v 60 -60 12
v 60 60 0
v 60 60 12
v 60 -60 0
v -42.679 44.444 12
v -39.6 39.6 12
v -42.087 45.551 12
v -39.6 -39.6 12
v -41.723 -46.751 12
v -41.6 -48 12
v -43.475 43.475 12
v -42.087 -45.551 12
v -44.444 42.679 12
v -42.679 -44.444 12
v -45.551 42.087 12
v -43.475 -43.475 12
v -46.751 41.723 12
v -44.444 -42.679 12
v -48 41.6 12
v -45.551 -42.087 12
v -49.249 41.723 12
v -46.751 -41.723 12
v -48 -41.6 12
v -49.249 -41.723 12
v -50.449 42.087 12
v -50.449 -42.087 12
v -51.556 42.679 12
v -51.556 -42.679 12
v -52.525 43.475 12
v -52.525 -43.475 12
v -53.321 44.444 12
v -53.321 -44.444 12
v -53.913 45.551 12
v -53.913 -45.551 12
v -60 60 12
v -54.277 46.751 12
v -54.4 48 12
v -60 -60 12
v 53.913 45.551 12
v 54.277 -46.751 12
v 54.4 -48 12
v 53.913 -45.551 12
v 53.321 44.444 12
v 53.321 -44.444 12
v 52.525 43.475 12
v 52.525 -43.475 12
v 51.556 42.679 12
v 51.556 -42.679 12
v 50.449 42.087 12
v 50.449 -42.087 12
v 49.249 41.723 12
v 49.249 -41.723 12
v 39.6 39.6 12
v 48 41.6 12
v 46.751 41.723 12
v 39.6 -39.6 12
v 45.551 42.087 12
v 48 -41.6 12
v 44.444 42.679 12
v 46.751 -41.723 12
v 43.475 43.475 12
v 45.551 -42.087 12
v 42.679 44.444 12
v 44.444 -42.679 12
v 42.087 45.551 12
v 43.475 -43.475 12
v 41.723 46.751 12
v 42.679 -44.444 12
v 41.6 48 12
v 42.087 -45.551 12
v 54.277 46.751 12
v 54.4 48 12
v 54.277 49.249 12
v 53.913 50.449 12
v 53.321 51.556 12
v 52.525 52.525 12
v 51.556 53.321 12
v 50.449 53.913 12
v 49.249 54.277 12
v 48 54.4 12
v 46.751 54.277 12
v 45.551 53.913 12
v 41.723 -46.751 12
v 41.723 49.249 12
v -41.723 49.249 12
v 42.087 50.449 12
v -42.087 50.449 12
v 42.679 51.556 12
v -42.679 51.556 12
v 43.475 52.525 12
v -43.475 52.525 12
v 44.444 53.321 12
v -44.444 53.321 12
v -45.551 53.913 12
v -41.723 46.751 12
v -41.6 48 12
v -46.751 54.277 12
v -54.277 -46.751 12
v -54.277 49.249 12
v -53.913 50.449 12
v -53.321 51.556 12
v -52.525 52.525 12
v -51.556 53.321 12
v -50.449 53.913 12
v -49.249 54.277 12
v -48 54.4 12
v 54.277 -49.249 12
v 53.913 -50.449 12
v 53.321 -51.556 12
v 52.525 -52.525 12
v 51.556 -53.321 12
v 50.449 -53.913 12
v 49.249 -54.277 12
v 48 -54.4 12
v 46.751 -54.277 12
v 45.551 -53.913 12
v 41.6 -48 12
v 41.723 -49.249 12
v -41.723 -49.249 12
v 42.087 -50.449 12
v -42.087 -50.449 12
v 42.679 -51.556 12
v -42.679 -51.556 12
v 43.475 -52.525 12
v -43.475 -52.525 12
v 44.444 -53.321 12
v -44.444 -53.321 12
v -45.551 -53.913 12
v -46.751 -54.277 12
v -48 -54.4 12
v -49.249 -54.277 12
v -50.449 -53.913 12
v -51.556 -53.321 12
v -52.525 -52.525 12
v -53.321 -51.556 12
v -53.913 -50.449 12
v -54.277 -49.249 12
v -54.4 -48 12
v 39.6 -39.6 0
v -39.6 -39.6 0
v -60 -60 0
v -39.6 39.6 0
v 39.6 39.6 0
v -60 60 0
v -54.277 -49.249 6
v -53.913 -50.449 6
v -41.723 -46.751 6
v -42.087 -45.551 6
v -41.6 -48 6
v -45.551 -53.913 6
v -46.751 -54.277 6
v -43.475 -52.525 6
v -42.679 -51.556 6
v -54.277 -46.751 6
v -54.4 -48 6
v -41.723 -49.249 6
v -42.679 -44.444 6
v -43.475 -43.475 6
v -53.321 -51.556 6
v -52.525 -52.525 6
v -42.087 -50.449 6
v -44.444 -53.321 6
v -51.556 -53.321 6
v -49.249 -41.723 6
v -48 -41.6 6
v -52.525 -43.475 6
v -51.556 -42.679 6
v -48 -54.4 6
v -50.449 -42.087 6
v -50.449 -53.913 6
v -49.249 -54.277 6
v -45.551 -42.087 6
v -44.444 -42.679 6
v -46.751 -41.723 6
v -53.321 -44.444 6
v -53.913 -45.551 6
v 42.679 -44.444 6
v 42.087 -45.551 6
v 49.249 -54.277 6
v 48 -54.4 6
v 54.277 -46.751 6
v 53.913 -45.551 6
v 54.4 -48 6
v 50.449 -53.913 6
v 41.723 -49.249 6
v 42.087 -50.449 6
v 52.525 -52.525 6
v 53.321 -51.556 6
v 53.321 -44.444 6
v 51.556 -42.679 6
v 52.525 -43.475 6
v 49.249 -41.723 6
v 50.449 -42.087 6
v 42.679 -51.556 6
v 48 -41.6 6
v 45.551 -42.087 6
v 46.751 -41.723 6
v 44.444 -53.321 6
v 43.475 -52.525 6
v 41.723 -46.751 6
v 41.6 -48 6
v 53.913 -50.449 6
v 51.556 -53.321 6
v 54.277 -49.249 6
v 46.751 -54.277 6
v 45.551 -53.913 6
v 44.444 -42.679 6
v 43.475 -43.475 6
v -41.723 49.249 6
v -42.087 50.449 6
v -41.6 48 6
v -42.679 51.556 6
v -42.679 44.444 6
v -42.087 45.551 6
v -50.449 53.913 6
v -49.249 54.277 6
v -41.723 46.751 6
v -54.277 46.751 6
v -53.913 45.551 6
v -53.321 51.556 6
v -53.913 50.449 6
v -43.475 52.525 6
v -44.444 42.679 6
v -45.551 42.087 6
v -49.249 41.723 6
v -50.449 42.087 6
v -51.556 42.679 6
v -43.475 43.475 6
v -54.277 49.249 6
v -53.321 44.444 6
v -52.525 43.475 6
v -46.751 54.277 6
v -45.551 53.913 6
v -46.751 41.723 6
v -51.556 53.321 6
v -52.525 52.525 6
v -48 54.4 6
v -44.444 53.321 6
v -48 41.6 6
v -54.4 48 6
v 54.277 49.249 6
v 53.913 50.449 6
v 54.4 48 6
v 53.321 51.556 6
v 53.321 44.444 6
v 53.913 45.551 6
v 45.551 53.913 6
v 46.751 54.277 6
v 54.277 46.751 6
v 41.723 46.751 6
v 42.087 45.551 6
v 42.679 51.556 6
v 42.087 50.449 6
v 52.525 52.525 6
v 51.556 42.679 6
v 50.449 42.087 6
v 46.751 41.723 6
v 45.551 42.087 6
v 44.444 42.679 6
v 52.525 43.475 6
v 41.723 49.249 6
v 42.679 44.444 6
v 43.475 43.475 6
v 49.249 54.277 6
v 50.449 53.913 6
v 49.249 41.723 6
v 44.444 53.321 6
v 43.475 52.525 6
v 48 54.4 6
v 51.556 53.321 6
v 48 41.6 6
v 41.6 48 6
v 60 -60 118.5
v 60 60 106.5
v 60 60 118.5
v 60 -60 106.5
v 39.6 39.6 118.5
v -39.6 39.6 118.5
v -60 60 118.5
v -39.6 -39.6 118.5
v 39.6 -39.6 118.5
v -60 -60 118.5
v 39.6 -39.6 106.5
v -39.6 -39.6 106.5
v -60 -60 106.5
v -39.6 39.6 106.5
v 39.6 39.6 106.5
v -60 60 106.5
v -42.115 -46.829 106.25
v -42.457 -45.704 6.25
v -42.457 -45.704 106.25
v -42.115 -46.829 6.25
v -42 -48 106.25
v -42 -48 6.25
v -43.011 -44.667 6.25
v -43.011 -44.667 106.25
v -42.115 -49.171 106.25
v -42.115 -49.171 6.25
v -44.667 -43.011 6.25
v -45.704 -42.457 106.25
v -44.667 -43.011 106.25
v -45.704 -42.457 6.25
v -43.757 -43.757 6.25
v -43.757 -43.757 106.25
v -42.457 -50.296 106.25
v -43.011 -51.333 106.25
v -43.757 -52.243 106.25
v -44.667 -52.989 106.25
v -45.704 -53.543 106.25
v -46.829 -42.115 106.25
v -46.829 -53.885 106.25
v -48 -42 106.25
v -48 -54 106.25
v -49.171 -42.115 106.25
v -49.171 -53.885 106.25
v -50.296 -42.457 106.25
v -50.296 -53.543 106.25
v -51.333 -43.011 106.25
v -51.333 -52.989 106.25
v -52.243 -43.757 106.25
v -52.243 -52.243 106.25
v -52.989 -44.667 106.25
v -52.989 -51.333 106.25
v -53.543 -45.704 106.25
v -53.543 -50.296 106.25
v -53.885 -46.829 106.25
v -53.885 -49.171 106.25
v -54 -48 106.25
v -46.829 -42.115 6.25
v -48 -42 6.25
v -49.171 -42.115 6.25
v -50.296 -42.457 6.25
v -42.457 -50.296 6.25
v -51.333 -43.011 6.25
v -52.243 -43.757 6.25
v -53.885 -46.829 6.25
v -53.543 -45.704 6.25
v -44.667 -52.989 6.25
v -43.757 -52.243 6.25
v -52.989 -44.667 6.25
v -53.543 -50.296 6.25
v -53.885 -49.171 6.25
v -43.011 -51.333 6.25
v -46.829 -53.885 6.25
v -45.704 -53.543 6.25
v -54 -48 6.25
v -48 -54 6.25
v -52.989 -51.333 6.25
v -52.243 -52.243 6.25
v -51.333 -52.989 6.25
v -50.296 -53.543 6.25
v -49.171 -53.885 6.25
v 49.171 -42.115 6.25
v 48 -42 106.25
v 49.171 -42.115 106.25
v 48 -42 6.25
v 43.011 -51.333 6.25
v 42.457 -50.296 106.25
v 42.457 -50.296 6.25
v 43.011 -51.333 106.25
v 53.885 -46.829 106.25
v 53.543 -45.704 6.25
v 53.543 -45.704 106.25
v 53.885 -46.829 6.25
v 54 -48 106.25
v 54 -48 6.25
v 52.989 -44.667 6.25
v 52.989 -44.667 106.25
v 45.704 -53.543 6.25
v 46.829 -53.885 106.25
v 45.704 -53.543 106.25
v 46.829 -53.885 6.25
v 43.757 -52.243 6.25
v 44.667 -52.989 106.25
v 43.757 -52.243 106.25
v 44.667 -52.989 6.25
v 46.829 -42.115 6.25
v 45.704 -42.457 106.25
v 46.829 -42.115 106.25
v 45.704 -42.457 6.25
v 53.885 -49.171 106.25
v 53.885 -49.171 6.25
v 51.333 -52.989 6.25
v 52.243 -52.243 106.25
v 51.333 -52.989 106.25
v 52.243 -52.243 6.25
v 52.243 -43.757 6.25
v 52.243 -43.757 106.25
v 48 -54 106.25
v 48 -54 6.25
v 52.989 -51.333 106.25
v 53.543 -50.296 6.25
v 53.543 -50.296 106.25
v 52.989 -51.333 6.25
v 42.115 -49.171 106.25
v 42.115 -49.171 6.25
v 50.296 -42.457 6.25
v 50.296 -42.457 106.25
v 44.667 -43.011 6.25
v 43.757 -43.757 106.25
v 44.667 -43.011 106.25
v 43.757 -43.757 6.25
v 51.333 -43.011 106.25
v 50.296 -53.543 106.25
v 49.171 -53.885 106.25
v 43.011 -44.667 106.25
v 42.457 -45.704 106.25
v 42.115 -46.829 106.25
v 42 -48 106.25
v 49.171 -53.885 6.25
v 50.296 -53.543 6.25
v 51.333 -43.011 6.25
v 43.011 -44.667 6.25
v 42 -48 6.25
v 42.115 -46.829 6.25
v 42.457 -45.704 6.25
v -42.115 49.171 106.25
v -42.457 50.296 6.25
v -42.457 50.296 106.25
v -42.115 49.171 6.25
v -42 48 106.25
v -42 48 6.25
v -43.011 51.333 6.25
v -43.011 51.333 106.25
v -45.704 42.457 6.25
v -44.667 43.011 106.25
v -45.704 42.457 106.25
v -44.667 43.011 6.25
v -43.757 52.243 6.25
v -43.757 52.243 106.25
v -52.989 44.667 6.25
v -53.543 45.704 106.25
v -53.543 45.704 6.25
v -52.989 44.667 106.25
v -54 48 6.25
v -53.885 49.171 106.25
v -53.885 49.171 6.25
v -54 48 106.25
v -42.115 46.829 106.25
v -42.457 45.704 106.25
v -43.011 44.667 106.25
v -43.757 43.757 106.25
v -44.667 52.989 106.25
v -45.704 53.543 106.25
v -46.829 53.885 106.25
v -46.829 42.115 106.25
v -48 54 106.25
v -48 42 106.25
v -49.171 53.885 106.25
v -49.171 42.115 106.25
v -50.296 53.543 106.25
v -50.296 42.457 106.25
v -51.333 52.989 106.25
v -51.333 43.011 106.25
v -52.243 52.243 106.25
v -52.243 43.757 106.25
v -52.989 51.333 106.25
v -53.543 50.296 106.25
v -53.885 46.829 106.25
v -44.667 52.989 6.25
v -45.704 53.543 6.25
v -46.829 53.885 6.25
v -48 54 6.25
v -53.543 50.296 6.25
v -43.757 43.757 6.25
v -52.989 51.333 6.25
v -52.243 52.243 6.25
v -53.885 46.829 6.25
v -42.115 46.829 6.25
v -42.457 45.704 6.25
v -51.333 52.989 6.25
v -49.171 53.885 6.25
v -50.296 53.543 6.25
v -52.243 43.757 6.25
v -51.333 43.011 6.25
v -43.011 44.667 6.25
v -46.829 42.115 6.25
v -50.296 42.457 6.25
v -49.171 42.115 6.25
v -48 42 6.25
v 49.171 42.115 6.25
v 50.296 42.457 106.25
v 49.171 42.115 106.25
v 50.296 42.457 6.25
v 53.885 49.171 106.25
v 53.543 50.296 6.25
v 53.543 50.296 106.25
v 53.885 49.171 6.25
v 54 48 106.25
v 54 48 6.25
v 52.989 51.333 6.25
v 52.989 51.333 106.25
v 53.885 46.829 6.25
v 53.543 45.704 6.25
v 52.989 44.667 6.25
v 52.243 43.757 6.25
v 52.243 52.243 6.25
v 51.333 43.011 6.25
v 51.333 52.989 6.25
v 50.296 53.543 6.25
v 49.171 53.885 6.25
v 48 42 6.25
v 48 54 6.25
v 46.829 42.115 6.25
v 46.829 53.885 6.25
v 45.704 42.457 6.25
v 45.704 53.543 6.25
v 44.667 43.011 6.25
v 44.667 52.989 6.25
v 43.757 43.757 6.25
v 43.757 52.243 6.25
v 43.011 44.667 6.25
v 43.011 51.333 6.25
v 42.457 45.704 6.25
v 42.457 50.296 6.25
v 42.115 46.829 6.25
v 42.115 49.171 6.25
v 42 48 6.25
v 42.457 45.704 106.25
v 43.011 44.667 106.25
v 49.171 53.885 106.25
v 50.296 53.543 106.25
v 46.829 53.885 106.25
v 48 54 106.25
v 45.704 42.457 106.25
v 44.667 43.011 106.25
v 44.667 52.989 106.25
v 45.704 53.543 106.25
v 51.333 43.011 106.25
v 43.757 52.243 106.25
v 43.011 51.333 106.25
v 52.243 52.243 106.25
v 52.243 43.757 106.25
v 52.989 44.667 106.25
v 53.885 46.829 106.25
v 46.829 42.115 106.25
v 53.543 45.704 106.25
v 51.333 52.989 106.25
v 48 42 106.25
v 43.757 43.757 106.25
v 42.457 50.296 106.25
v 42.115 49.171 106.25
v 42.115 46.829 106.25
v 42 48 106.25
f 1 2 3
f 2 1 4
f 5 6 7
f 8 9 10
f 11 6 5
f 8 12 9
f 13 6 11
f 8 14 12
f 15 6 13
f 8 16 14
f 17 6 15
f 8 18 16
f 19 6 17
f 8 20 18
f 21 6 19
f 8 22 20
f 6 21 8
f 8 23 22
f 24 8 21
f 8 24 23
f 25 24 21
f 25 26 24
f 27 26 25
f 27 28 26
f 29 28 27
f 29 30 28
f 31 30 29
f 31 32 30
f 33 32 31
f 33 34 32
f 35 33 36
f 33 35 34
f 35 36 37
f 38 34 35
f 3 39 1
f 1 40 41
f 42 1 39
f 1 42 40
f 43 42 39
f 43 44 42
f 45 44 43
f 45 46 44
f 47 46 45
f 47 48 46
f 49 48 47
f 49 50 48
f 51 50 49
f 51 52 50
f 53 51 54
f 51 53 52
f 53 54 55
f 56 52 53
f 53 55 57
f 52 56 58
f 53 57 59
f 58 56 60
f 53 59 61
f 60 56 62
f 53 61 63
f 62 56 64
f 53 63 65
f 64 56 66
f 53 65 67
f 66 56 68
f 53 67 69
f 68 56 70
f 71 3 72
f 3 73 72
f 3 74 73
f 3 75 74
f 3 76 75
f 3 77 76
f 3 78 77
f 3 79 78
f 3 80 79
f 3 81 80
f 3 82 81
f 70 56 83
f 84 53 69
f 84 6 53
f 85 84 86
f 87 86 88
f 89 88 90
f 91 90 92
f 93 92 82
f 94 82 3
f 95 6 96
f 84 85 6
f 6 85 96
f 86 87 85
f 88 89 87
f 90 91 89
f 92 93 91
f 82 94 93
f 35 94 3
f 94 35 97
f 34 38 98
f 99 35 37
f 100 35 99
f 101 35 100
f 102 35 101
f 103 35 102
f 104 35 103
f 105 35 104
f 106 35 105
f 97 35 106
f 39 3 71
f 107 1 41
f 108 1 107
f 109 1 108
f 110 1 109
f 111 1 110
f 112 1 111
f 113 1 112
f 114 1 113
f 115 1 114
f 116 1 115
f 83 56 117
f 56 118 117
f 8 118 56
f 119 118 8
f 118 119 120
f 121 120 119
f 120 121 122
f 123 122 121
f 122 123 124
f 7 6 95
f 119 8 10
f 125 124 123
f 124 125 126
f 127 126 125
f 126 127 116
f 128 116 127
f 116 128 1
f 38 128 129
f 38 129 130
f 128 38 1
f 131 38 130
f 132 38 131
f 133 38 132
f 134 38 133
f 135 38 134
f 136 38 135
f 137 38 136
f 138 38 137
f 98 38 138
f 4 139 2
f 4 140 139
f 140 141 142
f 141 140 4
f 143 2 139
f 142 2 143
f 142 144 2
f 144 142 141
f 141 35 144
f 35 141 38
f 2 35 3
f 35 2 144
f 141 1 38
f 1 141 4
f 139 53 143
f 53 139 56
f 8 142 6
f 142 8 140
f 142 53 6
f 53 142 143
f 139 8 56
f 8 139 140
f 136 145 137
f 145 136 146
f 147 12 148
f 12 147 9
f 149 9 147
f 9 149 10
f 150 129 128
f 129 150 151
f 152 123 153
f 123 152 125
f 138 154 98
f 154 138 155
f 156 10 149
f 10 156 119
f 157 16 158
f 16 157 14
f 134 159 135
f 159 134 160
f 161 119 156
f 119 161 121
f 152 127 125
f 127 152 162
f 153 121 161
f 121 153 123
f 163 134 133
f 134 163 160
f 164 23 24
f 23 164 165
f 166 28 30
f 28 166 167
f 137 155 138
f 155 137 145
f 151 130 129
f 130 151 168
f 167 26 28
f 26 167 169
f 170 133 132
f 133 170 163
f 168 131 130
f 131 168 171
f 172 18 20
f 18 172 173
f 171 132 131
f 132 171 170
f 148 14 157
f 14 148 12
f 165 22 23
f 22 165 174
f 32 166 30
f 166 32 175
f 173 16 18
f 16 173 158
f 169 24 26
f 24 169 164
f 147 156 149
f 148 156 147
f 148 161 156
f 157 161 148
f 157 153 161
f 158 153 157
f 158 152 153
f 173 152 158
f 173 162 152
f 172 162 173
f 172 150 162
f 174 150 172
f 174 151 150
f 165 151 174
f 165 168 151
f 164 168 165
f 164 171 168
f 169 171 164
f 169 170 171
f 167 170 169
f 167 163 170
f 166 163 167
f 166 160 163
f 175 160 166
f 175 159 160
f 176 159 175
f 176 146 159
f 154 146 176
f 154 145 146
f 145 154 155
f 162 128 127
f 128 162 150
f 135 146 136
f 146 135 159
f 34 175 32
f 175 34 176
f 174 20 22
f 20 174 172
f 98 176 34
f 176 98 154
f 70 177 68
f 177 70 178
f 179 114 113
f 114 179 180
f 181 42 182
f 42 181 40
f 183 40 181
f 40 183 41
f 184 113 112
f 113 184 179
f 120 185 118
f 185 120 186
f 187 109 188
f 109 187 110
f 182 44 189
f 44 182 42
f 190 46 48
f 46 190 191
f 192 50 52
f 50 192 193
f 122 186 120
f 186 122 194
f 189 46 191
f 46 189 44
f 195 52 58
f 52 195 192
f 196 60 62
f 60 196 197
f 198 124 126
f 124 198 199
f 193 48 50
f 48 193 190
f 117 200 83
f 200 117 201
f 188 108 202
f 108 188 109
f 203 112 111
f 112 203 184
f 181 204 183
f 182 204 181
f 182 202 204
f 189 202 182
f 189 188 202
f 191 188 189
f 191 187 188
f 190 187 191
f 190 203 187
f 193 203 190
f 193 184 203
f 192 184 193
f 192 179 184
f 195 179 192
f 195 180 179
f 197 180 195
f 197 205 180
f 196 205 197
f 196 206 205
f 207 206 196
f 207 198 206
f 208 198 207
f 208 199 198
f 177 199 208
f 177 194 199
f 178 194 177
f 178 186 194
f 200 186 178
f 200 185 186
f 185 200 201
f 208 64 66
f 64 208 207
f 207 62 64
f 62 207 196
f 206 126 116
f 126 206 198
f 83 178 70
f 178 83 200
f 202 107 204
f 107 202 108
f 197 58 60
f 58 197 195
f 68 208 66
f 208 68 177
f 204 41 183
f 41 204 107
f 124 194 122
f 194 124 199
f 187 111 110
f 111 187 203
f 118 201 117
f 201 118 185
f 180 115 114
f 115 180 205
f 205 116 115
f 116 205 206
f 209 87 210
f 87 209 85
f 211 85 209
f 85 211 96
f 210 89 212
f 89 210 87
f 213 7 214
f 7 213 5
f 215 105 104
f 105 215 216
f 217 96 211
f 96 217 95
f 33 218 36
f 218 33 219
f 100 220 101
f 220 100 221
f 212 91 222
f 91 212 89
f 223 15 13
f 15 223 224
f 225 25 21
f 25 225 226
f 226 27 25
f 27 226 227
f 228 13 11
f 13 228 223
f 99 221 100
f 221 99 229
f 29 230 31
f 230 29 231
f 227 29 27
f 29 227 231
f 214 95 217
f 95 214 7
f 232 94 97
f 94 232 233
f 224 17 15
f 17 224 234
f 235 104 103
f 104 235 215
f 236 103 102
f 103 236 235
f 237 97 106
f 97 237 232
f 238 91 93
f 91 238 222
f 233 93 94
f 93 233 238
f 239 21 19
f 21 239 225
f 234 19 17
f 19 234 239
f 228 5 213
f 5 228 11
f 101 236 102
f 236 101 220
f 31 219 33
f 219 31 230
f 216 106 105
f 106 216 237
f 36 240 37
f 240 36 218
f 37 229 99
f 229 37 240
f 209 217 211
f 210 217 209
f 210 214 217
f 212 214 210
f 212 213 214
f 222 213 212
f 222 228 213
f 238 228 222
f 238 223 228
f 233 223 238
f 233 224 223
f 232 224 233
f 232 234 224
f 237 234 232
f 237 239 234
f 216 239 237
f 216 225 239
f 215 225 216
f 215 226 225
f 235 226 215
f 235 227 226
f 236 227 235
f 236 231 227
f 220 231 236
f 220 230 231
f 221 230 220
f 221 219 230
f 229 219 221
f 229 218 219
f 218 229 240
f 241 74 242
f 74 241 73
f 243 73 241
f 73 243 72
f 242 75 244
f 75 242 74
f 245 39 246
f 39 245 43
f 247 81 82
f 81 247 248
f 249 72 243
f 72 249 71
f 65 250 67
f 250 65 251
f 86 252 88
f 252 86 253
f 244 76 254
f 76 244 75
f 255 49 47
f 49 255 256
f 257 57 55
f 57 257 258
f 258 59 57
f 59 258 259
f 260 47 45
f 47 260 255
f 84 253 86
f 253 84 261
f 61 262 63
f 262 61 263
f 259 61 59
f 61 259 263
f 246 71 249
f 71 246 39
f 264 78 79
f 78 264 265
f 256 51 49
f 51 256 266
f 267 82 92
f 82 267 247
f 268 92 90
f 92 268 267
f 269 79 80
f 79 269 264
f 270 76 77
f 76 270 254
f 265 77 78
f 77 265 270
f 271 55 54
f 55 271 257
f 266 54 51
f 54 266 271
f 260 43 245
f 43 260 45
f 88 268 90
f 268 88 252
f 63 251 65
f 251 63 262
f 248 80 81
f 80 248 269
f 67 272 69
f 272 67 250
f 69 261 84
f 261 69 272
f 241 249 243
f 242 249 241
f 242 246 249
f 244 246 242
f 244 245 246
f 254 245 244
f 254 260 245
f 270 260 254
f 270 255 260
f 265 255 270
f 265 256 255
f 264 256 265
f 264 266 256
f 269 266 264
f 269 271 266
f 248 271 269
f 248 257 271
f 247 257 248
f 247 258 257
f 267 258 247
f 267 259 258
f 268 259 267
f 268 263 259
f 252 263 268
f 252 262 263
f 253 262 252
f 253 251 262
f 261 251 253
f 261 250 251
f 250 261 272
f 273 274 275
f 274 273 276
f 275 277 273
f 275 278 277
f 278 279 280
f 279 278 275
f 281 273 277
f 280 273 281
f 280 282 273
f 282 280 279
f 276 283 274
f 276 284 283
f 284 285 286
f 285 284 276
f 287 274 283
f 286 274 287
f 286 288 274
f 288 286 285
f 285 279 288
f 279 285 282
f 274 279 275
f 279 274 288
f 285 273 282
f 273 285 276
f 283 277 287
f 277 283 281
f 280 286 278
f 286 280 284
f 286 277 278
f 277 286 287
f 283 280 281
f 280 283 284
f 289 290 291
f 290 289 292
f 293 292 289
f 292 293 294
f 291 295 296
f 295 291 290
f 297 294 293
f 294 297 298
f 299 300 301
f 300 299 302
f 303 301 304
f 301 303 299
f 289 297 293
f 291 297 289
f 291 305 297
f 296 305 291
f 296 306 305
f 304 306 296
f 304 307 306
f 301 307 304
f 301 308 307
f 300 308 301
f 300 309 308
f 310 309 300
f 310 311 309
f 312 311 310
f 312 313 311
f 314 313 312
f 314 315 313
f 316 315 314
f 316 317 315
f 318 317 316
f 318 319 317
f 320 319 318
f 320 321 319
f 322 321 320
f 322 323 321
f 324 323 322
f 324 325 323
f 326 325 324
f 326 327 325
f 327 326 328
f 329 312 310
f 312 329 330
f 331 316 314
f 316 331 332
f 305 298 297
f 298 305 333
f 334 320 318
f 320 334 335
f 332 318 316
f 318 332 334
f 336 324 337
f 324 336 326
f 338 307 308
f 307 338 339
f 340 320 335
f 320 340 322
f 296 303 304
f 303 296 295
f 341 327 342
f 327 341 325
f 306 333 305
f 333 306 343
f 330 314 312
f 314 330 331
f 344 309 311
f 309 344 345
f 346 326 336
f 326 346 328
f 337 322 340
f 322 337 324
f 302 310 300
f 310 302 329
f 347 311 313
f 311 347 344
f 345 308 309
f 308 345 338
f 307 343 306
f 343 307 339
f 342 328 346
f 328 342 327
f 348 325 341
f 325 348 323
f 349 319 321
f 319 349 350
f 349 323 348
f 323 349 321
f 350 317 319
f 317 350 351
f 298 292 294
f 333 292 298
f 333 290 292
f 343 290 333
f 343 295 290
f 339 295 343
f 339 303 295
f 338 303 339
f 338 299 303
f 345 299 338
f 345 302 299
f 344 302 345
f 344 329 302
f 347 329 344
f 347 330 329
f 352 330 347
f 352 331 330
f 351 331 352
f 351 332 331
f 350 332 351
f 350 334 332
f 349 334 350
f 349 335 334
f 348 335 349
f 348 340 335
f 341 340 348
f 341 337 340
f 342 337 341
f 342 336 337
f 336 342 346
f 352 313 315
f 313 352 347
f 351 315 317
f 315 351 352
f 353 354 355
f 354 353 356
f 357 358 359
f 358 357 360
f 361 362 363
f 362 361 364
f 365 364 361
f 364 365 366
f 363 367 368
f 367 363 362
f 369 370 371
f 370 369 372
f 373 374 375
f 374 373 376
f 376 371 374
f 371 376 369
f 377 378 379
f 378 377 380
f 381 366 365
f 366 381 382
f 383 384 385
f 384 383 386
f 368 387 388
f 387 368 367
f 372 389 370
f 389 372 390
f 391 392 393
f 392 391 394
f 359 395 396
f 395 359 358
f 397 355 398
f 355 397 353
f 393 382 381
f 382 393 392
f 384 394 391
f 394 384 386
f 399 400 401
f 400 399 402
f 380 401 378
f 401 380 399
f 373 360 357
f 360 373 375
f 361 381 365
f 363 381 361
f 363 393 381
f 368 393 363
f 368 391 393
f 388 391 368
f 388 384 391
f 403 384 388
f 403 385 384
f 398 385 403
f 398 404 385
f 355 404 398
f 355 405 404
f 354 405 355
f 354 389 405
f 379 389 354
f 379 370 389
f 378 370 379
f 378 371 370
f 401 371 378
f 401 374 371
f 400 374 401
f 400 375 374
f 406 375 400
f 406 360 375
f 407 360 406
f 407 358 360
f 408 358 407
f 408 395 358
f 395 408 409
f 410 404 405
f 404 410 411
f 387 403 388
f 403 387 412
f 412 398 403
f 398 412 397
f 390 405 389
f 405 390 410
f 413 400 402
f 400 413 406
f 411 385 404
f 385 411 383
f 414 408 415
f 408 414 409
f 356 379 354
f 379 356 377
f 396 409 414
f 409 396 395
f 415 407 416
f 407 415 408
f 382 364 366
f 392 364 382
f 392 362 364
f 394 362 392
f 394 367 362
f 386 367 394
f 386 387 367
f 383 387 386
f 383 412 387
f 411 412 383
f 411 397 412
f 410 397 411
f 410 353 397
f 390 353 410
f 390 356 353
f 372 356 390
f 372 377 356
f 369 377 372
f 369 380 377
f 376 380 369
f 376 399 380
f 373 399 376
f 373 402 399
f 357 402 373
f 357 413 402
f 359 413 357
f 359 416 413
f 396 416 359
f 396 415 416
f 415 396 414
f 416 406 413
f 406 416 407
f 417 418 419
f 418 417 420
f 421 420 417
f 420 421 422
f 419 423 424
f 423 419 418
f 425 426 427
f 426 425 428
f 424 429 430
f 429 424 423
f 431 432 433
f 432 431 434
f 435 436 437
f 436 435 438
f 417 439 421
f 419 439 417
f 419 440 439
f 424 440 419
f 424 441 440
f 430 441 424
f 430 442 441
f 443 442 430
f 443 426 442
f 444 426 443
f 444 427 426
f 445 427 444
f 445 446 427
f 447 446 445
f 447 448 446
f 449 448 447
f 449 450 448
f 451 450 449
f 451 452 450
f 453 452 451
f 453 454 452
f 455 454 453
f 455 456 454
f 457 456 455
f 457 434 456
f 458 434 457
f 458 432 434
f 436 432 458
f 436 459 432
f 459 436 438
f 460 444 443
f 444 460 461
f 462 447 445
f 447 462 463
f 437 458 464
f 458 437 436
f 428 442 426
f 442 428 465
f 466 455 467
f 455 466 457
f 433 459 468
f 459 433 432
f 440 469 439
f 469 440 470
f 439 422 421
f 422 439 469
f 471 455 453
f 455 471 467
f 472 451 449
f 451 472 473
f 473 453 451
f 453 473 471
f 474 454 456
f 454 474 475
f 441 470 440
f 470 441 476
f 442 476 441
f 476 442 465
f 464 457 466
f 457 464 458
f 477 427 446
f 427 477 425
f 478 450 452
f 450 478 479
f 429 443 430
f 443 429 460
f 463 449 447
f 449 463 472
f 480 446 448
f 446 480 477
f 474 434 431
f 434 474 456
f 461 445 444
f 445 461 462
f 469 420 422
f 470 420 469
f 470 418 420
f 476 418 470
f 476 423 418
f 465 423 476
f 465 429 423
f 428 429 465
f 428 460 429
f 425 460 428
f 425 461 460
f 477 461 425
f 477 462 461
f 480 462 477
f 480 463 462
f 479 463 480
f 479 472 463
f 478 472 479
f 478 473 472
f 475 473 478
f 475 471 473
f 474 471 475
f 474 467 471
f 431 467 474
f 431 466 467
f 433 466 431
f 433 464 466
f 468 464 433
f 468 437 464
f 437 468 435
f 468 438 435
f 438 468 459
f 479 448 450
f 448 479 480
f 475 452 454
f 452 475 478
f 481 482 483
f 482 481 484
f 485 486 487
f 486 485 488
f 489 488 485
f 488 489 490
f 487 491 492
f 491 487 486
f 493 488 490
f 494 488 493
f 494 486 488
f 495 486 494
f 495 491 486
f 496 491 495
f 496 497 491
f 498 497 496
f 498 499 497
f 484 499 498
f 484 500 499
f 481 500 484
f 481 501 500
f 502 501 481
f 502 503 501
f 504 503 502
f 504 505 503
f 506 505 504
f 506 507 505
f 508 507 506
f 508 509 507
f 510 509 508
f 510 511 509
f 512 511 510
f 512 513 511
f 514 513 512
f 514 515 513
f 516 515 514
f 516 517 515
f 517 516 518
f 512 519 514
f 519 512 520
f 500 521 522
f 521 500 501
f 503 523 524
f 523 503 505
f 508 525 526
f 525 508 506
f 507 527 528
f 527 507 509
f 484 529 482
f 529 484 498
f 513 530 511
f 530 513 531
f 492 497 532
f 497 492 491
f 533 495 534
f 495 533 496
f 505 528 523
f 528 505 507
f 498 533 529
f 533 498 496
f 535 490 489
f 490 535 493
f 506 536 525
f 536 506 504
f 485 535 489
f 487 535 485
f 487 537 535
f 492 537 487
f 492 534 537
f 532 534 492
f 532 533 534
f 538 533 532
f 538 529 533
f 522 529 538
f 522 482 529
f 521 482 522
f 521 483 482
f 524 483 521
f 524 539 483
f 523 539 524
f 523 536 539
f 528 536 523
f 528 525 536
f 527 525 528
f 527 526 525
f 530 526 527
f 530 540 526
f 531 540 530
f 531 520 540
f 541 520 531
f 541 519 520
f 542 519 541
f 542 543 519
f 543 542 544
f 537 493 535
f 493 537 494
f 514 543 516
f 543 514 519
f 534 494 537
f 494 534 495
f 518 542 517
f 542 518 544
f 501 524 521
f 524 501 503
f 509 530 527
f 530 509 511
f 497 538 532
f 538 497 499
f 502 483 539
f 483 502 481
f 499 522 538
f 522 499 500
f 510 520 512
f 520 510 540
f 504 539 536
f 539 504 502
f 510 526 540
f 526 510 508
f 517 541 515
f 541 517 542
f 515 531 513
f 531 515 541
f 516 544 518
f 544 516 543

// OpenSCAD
$fn = 32;

// ------------------------------------------------------------------------
// Frame cube: base 120 x 120 mm, posts 100 mm tall
// Every part is its own module, assembly() places every instance.
// ------------------------------------------------------------------------

// --- part 1 ---
module base_frame() {
  difference() {
    translate([-60, -60, 0]) cube([120, 120, 12]);
    translate([-39.6, -39.6, -1]) cube([79.2, 79.2, 14]);
    translate([-48, -48, 6]) cylinder(h = 7, d = 12.8);
    translate([48, -48, 6]) cylinder(h = 7, d = 12.8);
    translate([-48, 48, 6]) cylinder(h = 7, d = 12.8);
    translate([48, 48, 6]) cylinder(h = 7, d = 12.8);
  }
}

// --- part 2 ---
module corner_post() {
  cylinder(h = 100, d = 12);
}

// --- part 3 ---
module top_frame() {
  difference() {
    translate([-60, -60, 0]) cube([120, 120, 12]);
    translate([-39.6, -39.6, -1]) cube([79.2, 79.2, 14]);
  }
}

// --- assembly ---
module assembly() {
  color([0.80, 0.24, 0.20]) translate([0, 0, 0]) rotate([0, 0, 0]) base_frame();
  color([0.20, 0.45, 0.75]) translate([-48, -48, 6.25]) rotate([0, 0, 0]) corner_post();
  color([0.25, 0.62, 0.32]) translate([48, -48, 6.25]) rotate([0, 0, 0]) corner_post();
  color([0.92, 0.70, 0.18]) translate([-48, 48, 6.25]) rotate([0, 0, 0]) corner_post();
  color([0.58, 0.35, 0.70]) translate([48, 48, 6.25]) rotate([0, 0, 0]) corner_post();
  color([0.16, 0.66, 0.66]) translate([0, 0, 106.5]) rotate([0, 0, 0]) top_frame();
}

assembly();
